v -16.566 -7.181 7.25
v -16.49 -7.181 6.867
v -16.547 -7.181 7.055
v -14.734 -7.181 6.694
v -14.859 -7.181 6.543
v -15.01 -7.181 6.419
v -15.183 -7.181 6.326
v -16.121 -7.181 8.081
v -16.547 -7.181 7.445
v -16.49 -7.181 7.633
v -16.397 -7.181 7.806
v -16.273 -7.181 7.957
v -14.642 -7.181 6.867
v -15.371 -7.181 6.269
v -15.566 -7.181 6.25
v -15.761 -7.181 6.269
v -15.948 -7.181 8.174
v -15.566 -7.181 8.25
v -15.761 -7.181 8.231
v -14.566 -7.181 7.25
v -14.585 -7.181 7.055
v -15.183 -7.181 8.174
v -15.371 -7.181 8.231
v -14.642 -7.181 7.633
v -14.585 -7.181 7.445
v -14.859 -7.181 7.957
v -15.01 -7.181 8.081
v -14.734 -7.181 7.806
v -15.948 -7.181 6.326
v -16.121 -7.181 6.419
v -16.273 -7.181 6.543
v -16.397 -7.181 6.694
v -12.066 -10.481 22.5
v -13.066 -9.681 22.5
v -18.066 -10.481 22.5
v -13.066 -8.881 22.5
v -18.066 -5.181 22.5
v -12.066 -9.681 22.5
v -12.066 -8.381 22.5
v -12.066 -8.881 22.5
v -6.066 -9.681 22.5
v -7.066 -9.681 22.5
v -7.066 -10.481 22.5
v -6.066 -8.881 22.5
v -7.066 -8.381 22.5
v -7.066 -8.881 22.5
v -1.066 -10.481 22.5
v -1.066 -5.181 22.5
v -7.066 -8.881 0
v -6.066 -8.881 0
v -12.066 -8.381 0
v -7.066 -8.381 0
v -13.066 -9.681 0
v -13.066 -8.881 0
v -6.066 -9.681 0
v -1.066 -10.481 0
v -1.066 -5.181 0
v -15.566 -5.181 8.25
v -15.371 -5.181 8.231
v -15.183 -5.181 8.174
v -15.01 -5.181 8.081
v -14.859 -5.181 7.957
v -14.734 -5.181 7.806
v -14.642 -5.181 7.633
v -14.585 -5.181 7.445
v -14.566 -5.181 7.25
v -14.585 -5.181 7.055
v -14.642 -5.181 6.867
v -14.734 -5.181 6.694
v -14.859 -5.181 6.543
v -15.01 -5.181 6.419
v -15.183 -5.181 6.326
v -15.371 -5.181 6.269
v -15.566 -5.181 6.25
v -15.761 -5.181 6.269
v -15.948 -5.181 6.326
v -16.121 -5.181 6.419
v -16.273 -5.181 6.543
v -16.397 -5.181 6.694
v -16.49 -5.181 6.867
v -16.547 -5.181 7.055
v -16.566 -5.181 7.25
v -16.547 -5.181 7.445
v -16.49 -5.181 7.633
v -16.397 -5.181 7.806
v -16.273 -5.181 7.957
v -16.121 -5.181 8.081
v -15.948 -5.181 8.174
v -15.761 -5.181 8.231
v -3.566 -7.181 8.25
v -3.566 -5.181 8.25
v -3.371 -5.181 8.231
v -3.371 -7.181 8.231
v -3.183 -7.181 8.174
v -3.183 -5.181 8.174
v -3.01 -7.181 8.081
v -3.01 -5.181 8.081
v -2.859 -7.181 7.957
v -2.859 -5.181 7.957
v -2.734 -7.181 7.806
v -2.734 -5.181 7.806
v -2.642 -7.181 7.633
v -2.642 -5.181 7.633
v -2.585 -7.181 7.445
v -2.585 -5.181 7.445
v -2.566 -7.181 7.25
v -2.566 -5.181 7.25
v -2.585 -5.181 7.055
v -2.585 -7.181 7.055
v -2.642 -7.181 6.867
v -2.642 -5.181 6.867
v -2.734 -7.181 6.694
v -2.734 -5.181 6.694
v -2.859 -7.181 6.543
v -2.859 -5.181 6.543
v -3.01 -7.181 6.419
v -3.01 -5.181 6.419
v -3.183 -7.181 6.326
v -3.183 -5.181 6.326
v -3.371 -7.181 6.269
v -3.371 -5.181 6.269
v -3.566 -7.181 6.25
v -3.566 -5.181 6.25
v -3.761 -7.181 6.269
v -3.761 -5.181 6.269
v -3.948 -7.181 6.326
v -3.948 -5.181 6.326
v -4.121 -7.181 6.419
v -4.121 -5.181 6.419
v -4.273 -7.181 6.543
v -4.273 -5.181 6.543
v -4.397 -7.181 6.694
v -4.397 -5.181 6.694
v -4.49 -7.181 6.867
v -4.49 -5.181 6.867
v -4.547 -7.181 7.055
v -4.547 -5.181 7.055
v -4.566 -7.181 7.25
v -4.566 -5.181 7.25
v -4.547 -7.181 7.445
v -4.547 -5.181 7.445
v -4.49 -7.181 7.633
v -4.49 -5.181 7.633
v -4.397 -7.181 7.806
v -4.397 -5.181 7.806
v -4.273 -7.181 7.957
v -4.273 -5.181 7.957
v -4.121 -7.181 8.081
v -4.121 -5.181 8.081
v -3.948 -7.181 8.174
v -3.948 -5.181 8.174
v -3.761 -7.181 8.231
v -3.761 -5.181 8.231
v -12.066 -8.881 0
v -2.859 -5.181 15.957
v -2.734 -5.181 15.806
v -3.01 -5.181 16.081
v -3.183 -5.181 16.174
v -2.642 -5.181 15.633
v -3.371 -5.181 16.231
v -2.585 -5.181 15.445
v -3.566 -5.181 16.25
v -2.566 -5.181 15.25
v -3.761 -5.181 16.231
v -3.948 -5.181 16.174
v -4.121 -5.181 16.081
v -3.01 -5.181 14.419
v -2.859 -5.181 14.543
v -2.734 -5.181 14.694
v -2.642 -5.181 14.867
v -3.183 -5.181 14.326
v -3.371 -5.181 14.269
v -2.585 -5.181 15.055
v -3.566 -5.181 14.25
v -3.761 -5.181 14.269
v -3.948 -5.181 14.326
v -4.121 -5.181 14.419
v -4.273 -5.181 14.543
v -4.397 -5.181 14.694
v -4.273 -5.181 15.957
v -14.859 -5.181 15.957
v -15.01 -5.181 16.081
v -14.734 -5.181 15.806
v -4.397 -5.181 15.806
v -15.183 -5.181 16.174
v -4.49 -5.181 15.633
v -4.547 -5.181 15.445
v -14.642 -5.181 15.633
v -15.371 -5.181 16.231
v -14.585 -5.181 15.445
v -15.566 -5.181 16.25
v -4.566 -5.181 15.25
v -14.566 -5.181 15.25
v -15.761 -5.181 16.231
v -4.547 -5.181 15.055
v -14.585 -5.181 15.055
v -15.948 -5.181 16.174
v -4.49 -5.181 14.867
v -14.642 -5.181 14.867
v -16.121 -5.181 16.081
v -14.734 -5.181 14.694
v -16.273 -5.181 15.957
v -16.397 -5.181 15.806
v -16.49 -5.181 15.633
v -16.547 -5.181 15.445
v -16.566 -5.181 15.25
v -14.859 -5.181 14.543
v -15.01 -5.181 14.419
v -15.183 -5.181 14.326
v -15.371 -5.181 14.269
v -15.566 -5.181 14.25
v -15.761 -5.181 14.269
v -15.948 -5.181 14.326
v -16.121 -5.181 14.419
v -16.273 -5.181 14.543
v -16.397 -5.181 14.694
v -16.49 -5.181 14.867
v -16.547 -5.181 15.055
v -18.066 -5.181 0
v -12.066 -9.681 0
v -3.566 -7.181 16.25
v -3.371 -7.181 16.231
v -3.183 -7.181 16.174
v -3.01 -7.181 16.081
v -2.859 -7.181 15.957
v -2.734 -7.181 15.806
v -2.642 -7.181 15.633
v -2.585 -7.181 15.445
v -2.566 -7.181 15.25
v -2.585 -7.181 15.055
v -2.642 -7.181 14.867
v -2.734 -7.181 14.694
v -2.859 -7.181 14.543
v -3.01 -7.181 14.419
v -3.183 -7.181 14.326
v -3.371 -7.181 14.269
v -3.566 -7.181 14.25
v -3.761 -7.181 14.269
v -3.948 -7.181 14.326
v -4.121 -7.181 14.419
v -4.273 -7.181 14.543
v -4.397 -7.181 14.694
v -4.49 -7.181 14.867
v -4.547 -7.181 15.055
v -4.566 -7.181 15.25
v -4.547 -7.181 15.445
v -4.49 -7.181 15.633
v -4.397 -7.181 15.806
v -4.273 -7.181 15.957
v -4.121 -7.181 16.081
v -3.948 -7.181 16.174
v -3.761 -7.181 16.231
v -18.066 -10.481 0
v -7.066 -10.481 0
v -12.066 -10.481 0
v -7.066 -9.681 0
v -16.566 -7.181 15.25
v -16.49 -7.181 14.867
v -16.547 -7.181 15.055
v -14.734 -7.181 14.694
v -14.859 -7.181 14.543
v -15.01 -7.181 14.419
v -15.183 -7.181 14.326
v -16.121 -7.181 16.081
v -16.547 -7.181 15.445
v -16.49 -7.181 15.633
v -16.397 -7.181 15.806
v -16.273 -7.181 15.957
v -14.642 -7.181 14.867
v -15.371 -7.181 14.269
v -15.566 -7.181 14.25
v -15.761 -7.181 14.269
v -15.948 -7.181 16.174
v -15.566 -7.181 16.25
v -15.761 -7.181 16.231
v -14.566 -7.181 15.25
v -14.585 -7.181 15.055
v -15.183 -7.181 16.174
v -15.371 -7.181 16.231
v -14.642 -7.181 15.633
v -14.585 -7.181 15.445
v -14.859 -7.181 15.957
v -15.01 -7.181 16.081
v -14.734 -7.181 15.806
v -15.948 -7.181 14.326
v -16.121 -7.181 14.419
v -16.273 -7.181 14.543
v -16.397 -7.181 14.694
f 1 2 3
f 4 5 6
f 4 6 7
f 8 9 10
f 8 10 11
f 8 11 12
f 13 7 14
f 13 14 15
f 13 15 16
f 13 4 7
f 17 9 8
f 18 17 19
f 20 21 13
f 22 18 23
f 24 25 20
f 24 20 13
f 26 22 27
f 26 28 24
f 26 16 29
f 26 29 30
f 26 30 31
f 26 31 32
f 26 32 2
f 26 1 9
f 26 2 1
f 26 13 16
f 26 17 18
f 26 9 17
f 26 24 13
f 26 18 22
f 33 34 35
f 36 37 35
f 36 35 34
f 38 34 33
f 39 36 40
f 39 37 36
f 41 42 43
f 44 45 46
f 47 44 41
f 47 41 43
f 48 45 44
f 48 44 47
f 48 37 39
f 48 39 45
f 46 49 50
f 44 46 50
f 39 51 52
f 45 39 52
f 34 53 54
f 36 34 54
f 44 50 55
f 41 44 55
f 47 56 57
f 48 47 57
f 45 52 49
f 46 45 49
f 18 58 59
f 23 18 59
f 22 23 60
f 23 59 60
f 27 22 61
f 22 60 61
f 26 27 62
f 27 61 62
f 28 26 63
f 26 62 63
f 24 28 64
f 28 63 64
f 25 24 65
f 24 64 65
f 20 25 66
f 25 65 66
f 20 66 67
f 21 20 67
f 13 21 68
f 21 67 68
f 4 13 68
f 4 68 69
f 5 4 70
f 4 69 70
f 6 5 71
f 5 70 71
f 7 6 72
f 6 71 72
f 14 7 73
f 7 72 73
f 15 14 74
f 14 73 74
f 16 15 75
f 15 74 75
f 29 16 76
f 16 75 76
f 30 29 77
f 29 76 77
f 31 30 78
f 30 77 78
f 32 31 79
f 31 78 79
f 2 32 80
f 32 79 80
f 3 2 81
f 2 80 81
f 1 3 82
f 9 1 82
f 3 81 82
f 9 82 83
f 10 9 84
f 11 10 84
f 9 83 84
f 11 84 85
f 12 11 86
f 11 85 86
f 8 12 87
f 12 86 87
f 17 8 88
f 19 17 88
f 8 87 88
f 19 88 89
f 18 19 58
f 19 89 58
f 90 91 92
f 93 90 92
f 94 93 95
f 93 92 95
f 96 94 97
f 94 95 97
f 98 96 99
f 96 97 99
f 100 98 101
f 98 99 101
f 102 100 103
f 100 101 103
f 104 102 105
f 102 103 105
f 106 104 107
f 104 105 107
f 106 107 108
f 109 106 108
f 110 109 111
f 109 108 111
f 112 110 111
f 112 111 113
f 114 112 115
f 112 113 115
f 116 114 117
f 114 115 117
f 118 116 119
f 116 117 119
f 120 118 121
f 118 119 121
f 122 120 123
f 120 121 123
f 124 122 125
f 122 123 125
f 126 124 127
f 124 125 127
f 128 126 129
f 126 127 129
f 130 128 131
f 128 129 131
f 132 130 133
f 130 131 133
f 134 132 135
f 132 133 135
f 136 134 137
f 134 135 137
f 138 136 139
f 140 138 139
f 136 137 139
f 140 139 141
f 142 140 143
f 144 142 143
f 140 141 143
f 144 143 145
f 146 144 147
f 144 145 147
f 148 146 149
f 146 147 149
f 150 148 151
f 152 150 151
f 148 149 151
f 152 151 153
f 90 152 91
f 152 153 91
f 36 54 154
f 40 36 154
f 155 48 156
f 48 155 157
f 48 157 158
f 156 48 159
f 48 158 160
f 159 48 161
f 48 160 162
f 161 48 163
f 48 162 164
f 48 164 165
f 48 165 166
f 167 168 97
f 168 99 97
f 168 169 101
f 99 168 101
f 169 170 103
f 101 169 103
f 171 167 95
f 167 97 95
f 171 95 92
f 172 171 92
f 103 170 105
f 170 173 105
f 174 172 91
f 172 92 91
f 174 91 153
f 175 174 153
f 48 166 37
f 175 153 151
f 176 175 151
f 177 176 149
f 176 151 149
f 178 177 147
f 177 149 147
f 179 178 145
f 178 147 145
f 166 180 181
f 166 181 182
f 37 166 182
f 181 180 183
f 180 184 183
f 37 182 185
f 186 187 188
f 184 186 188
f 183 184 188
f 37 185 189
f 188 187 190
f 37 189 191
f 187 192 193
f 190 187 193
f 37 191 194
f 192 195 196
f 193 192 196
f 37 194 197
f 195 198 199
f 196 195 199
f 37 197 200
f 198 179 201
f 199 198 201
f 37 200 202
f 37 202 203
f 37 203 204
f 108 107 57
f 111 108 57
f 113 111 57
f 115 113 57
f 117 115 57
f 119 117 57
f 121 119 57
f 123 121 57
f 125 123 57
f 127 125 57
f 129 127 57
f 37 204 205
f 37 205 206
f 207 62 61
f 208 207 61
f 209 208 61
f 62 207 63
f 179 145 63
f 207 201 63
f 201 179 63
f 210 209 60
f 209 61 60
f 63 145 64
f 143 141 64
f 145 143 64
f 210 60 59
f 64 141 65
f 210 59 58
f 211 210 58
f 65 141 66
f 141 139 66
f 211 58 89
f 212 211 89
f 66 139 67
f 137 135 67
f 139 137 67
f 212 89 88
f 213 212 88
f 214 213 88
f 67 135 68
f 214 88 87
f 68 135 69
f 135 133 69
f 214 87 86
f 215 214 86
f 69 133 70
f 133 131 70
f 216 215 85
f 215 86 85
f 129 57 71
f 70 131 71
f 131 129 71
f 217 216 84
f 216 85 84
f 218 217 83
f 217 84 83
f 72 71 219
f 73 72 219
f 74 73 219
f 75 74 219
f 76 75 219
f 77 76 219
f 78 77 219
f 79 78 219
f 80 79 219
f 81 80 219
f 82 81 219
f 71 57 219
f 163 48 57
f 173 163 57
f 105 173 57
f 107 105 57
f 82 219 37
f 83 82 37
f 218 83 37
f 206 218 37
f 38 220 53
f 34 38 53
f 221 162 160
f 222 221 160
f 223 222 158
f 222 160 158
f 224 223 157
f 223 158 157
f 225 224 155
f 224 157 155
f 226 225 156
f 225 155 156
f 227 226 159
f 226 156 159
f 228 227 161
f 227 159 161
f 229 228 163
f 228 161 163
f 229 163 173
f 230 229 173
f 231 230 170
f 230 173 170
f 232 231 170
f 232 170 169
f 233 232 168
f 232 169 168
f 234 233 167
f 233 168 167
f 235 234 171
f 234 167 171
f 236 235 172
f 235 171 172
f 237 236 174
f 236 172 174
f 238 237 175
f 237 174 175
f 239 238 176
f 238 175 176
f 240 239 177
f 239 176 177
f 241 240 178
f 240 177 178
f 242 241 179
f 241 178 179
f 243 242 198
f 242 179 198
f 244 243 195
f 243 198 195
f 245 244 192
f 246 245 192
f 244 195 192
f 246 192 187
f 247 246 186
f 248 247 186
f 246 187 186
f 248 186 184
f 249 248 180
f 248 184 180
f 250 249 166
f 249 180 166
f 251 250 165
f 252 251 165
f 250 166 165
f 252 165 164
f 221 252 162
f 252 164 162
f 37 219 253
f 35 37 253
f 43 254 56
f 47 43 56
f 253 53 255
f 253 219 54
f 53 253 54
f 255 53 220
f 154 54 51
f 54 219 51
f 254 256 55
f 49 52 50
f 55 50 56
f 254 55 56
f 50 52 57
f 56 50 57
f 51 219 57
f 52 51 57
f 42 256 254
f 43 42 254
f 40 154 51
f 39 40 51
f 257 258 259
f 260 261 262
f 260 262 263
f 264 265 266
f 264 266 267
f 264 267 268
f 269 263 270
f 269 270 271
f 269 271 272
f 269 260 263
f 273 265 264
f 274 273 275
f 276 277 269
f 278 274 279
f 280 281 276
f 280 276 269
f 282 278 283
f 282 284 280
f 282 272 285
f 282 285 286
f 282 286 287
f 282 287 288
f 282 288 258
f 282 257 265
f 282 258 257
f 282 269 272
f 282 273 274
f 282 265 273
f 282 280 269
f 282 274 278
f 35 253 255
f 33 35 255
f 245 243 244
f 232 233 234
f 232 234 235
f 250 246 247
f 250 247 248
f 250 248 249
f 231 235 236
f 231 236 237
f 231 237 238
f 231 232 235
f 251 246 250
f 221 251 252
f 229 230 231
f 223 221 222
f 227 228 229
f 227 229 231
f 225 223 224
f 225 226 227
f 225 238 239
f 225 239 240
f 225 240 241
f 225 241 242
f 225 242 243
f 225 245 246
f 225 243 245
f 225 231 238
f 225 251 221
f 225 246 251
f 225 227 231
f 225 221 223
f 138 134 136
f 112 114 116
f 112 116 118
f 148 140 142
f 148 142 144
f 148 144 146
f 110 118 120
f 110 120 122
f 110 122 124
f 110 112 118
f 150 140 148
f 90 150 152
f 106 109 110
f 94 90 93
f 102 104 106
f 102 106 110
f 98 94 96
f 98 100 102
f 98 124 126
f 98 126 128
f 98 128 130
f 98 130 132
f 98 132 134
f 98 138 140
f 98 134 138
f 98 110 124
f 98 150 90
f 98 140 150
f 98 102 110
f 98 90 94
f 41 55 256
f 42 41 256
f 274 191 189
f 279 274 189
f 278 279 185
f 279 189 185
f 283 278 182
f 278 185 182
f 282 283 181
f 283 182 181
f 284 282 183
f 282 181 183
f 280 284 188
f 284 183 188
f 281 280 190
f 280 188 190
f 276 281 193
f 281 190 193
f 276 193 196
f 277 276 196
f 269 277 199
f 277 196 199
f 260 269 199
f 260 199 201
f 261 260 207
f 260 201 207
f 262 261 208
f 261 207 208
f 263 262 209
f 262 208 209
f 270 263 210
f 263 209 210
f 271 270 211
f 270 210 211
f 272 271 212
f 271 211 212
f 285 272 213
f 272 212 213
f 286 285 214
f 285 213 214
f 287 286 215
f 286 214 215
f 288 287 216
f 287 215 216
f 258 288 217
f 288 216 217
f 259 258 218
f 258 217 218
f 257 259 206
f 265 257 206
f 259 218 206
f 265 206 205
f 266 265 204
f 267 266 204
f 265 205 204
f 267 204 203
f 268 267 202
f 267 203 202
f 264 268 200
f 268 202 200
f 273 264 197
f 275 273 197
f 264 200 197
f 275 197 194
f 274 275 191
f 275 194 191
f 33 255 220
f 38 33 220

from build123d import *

# Parameters (mm, degrees)
EXTRUDE_1_DEPTH     = 22.5
SKETCH_4_R          = 1
CUT_EXTRUDE_4_DEPTH = 2


with BuildPart() as part:
    # 草图1 → 凸台-拉伸1 (new body)
    with BuildSketch(Plane.XY):
        Polygon((-18.065809082, -5.18088445), (-18.065809082, -10.48088445), (-12.065809082, -10.48088445), (-12.065809082, -9.68088445), (-13.065809082, -9.68088445), (-13.065809082, -8.88088445), (-12.065809082, -8.88088445), (-12.065809082, -8.38088445), (-9.565809082, -8.38088445), (-9.565809082, -5.18088445), align=None)
        Polygon((-1.065809082, -5.18088445), (-9.565809082, -5.18088445), (-9.565809082, -8.38088445), (-7.065809082, -8.38088445), (-7.065809082, -8.88088445), (-6.065809082, -8.88088445), (-6.065809082, -9.68088445), (-7.065809082, -9.68088445), (-7.065809082, -10.48088445), (-1.065809082, -10.48088445), align=None)
    extrude(amount=EXTRUDE_1_DEPTH)

    # 草图4 → 切除-拉伸4 (cut)
    with BuildSketch(Plane(origin=(0, -5.18088445, 0), x_dir=(1, 0, 0), z_dir=(0, 1, 0))):
        with Locations(Location((-15.565809082, -7.25, 0), (0, 0, 270))):
            Circle(SKETCH_4_R)
        with Locations(Location((-15.565809082, -15.25, 0), (0, 0, 270))):
            Circle(SKETCH_4_R)
        with Locations(Location((-3.565809082, -7.25, 0), (0, 0, 270))):
            Circle(SKETCH_4_R)
        with Locations(Location((-3.565809082, -15.25, 0), (0, 0, 270))):
            Circle(SKETCH_4_R)
    extrude(amount=-CUT_EXTRUDE_4_DEPTH, mode=Mode.SUBTRACT)


solid = part.part
